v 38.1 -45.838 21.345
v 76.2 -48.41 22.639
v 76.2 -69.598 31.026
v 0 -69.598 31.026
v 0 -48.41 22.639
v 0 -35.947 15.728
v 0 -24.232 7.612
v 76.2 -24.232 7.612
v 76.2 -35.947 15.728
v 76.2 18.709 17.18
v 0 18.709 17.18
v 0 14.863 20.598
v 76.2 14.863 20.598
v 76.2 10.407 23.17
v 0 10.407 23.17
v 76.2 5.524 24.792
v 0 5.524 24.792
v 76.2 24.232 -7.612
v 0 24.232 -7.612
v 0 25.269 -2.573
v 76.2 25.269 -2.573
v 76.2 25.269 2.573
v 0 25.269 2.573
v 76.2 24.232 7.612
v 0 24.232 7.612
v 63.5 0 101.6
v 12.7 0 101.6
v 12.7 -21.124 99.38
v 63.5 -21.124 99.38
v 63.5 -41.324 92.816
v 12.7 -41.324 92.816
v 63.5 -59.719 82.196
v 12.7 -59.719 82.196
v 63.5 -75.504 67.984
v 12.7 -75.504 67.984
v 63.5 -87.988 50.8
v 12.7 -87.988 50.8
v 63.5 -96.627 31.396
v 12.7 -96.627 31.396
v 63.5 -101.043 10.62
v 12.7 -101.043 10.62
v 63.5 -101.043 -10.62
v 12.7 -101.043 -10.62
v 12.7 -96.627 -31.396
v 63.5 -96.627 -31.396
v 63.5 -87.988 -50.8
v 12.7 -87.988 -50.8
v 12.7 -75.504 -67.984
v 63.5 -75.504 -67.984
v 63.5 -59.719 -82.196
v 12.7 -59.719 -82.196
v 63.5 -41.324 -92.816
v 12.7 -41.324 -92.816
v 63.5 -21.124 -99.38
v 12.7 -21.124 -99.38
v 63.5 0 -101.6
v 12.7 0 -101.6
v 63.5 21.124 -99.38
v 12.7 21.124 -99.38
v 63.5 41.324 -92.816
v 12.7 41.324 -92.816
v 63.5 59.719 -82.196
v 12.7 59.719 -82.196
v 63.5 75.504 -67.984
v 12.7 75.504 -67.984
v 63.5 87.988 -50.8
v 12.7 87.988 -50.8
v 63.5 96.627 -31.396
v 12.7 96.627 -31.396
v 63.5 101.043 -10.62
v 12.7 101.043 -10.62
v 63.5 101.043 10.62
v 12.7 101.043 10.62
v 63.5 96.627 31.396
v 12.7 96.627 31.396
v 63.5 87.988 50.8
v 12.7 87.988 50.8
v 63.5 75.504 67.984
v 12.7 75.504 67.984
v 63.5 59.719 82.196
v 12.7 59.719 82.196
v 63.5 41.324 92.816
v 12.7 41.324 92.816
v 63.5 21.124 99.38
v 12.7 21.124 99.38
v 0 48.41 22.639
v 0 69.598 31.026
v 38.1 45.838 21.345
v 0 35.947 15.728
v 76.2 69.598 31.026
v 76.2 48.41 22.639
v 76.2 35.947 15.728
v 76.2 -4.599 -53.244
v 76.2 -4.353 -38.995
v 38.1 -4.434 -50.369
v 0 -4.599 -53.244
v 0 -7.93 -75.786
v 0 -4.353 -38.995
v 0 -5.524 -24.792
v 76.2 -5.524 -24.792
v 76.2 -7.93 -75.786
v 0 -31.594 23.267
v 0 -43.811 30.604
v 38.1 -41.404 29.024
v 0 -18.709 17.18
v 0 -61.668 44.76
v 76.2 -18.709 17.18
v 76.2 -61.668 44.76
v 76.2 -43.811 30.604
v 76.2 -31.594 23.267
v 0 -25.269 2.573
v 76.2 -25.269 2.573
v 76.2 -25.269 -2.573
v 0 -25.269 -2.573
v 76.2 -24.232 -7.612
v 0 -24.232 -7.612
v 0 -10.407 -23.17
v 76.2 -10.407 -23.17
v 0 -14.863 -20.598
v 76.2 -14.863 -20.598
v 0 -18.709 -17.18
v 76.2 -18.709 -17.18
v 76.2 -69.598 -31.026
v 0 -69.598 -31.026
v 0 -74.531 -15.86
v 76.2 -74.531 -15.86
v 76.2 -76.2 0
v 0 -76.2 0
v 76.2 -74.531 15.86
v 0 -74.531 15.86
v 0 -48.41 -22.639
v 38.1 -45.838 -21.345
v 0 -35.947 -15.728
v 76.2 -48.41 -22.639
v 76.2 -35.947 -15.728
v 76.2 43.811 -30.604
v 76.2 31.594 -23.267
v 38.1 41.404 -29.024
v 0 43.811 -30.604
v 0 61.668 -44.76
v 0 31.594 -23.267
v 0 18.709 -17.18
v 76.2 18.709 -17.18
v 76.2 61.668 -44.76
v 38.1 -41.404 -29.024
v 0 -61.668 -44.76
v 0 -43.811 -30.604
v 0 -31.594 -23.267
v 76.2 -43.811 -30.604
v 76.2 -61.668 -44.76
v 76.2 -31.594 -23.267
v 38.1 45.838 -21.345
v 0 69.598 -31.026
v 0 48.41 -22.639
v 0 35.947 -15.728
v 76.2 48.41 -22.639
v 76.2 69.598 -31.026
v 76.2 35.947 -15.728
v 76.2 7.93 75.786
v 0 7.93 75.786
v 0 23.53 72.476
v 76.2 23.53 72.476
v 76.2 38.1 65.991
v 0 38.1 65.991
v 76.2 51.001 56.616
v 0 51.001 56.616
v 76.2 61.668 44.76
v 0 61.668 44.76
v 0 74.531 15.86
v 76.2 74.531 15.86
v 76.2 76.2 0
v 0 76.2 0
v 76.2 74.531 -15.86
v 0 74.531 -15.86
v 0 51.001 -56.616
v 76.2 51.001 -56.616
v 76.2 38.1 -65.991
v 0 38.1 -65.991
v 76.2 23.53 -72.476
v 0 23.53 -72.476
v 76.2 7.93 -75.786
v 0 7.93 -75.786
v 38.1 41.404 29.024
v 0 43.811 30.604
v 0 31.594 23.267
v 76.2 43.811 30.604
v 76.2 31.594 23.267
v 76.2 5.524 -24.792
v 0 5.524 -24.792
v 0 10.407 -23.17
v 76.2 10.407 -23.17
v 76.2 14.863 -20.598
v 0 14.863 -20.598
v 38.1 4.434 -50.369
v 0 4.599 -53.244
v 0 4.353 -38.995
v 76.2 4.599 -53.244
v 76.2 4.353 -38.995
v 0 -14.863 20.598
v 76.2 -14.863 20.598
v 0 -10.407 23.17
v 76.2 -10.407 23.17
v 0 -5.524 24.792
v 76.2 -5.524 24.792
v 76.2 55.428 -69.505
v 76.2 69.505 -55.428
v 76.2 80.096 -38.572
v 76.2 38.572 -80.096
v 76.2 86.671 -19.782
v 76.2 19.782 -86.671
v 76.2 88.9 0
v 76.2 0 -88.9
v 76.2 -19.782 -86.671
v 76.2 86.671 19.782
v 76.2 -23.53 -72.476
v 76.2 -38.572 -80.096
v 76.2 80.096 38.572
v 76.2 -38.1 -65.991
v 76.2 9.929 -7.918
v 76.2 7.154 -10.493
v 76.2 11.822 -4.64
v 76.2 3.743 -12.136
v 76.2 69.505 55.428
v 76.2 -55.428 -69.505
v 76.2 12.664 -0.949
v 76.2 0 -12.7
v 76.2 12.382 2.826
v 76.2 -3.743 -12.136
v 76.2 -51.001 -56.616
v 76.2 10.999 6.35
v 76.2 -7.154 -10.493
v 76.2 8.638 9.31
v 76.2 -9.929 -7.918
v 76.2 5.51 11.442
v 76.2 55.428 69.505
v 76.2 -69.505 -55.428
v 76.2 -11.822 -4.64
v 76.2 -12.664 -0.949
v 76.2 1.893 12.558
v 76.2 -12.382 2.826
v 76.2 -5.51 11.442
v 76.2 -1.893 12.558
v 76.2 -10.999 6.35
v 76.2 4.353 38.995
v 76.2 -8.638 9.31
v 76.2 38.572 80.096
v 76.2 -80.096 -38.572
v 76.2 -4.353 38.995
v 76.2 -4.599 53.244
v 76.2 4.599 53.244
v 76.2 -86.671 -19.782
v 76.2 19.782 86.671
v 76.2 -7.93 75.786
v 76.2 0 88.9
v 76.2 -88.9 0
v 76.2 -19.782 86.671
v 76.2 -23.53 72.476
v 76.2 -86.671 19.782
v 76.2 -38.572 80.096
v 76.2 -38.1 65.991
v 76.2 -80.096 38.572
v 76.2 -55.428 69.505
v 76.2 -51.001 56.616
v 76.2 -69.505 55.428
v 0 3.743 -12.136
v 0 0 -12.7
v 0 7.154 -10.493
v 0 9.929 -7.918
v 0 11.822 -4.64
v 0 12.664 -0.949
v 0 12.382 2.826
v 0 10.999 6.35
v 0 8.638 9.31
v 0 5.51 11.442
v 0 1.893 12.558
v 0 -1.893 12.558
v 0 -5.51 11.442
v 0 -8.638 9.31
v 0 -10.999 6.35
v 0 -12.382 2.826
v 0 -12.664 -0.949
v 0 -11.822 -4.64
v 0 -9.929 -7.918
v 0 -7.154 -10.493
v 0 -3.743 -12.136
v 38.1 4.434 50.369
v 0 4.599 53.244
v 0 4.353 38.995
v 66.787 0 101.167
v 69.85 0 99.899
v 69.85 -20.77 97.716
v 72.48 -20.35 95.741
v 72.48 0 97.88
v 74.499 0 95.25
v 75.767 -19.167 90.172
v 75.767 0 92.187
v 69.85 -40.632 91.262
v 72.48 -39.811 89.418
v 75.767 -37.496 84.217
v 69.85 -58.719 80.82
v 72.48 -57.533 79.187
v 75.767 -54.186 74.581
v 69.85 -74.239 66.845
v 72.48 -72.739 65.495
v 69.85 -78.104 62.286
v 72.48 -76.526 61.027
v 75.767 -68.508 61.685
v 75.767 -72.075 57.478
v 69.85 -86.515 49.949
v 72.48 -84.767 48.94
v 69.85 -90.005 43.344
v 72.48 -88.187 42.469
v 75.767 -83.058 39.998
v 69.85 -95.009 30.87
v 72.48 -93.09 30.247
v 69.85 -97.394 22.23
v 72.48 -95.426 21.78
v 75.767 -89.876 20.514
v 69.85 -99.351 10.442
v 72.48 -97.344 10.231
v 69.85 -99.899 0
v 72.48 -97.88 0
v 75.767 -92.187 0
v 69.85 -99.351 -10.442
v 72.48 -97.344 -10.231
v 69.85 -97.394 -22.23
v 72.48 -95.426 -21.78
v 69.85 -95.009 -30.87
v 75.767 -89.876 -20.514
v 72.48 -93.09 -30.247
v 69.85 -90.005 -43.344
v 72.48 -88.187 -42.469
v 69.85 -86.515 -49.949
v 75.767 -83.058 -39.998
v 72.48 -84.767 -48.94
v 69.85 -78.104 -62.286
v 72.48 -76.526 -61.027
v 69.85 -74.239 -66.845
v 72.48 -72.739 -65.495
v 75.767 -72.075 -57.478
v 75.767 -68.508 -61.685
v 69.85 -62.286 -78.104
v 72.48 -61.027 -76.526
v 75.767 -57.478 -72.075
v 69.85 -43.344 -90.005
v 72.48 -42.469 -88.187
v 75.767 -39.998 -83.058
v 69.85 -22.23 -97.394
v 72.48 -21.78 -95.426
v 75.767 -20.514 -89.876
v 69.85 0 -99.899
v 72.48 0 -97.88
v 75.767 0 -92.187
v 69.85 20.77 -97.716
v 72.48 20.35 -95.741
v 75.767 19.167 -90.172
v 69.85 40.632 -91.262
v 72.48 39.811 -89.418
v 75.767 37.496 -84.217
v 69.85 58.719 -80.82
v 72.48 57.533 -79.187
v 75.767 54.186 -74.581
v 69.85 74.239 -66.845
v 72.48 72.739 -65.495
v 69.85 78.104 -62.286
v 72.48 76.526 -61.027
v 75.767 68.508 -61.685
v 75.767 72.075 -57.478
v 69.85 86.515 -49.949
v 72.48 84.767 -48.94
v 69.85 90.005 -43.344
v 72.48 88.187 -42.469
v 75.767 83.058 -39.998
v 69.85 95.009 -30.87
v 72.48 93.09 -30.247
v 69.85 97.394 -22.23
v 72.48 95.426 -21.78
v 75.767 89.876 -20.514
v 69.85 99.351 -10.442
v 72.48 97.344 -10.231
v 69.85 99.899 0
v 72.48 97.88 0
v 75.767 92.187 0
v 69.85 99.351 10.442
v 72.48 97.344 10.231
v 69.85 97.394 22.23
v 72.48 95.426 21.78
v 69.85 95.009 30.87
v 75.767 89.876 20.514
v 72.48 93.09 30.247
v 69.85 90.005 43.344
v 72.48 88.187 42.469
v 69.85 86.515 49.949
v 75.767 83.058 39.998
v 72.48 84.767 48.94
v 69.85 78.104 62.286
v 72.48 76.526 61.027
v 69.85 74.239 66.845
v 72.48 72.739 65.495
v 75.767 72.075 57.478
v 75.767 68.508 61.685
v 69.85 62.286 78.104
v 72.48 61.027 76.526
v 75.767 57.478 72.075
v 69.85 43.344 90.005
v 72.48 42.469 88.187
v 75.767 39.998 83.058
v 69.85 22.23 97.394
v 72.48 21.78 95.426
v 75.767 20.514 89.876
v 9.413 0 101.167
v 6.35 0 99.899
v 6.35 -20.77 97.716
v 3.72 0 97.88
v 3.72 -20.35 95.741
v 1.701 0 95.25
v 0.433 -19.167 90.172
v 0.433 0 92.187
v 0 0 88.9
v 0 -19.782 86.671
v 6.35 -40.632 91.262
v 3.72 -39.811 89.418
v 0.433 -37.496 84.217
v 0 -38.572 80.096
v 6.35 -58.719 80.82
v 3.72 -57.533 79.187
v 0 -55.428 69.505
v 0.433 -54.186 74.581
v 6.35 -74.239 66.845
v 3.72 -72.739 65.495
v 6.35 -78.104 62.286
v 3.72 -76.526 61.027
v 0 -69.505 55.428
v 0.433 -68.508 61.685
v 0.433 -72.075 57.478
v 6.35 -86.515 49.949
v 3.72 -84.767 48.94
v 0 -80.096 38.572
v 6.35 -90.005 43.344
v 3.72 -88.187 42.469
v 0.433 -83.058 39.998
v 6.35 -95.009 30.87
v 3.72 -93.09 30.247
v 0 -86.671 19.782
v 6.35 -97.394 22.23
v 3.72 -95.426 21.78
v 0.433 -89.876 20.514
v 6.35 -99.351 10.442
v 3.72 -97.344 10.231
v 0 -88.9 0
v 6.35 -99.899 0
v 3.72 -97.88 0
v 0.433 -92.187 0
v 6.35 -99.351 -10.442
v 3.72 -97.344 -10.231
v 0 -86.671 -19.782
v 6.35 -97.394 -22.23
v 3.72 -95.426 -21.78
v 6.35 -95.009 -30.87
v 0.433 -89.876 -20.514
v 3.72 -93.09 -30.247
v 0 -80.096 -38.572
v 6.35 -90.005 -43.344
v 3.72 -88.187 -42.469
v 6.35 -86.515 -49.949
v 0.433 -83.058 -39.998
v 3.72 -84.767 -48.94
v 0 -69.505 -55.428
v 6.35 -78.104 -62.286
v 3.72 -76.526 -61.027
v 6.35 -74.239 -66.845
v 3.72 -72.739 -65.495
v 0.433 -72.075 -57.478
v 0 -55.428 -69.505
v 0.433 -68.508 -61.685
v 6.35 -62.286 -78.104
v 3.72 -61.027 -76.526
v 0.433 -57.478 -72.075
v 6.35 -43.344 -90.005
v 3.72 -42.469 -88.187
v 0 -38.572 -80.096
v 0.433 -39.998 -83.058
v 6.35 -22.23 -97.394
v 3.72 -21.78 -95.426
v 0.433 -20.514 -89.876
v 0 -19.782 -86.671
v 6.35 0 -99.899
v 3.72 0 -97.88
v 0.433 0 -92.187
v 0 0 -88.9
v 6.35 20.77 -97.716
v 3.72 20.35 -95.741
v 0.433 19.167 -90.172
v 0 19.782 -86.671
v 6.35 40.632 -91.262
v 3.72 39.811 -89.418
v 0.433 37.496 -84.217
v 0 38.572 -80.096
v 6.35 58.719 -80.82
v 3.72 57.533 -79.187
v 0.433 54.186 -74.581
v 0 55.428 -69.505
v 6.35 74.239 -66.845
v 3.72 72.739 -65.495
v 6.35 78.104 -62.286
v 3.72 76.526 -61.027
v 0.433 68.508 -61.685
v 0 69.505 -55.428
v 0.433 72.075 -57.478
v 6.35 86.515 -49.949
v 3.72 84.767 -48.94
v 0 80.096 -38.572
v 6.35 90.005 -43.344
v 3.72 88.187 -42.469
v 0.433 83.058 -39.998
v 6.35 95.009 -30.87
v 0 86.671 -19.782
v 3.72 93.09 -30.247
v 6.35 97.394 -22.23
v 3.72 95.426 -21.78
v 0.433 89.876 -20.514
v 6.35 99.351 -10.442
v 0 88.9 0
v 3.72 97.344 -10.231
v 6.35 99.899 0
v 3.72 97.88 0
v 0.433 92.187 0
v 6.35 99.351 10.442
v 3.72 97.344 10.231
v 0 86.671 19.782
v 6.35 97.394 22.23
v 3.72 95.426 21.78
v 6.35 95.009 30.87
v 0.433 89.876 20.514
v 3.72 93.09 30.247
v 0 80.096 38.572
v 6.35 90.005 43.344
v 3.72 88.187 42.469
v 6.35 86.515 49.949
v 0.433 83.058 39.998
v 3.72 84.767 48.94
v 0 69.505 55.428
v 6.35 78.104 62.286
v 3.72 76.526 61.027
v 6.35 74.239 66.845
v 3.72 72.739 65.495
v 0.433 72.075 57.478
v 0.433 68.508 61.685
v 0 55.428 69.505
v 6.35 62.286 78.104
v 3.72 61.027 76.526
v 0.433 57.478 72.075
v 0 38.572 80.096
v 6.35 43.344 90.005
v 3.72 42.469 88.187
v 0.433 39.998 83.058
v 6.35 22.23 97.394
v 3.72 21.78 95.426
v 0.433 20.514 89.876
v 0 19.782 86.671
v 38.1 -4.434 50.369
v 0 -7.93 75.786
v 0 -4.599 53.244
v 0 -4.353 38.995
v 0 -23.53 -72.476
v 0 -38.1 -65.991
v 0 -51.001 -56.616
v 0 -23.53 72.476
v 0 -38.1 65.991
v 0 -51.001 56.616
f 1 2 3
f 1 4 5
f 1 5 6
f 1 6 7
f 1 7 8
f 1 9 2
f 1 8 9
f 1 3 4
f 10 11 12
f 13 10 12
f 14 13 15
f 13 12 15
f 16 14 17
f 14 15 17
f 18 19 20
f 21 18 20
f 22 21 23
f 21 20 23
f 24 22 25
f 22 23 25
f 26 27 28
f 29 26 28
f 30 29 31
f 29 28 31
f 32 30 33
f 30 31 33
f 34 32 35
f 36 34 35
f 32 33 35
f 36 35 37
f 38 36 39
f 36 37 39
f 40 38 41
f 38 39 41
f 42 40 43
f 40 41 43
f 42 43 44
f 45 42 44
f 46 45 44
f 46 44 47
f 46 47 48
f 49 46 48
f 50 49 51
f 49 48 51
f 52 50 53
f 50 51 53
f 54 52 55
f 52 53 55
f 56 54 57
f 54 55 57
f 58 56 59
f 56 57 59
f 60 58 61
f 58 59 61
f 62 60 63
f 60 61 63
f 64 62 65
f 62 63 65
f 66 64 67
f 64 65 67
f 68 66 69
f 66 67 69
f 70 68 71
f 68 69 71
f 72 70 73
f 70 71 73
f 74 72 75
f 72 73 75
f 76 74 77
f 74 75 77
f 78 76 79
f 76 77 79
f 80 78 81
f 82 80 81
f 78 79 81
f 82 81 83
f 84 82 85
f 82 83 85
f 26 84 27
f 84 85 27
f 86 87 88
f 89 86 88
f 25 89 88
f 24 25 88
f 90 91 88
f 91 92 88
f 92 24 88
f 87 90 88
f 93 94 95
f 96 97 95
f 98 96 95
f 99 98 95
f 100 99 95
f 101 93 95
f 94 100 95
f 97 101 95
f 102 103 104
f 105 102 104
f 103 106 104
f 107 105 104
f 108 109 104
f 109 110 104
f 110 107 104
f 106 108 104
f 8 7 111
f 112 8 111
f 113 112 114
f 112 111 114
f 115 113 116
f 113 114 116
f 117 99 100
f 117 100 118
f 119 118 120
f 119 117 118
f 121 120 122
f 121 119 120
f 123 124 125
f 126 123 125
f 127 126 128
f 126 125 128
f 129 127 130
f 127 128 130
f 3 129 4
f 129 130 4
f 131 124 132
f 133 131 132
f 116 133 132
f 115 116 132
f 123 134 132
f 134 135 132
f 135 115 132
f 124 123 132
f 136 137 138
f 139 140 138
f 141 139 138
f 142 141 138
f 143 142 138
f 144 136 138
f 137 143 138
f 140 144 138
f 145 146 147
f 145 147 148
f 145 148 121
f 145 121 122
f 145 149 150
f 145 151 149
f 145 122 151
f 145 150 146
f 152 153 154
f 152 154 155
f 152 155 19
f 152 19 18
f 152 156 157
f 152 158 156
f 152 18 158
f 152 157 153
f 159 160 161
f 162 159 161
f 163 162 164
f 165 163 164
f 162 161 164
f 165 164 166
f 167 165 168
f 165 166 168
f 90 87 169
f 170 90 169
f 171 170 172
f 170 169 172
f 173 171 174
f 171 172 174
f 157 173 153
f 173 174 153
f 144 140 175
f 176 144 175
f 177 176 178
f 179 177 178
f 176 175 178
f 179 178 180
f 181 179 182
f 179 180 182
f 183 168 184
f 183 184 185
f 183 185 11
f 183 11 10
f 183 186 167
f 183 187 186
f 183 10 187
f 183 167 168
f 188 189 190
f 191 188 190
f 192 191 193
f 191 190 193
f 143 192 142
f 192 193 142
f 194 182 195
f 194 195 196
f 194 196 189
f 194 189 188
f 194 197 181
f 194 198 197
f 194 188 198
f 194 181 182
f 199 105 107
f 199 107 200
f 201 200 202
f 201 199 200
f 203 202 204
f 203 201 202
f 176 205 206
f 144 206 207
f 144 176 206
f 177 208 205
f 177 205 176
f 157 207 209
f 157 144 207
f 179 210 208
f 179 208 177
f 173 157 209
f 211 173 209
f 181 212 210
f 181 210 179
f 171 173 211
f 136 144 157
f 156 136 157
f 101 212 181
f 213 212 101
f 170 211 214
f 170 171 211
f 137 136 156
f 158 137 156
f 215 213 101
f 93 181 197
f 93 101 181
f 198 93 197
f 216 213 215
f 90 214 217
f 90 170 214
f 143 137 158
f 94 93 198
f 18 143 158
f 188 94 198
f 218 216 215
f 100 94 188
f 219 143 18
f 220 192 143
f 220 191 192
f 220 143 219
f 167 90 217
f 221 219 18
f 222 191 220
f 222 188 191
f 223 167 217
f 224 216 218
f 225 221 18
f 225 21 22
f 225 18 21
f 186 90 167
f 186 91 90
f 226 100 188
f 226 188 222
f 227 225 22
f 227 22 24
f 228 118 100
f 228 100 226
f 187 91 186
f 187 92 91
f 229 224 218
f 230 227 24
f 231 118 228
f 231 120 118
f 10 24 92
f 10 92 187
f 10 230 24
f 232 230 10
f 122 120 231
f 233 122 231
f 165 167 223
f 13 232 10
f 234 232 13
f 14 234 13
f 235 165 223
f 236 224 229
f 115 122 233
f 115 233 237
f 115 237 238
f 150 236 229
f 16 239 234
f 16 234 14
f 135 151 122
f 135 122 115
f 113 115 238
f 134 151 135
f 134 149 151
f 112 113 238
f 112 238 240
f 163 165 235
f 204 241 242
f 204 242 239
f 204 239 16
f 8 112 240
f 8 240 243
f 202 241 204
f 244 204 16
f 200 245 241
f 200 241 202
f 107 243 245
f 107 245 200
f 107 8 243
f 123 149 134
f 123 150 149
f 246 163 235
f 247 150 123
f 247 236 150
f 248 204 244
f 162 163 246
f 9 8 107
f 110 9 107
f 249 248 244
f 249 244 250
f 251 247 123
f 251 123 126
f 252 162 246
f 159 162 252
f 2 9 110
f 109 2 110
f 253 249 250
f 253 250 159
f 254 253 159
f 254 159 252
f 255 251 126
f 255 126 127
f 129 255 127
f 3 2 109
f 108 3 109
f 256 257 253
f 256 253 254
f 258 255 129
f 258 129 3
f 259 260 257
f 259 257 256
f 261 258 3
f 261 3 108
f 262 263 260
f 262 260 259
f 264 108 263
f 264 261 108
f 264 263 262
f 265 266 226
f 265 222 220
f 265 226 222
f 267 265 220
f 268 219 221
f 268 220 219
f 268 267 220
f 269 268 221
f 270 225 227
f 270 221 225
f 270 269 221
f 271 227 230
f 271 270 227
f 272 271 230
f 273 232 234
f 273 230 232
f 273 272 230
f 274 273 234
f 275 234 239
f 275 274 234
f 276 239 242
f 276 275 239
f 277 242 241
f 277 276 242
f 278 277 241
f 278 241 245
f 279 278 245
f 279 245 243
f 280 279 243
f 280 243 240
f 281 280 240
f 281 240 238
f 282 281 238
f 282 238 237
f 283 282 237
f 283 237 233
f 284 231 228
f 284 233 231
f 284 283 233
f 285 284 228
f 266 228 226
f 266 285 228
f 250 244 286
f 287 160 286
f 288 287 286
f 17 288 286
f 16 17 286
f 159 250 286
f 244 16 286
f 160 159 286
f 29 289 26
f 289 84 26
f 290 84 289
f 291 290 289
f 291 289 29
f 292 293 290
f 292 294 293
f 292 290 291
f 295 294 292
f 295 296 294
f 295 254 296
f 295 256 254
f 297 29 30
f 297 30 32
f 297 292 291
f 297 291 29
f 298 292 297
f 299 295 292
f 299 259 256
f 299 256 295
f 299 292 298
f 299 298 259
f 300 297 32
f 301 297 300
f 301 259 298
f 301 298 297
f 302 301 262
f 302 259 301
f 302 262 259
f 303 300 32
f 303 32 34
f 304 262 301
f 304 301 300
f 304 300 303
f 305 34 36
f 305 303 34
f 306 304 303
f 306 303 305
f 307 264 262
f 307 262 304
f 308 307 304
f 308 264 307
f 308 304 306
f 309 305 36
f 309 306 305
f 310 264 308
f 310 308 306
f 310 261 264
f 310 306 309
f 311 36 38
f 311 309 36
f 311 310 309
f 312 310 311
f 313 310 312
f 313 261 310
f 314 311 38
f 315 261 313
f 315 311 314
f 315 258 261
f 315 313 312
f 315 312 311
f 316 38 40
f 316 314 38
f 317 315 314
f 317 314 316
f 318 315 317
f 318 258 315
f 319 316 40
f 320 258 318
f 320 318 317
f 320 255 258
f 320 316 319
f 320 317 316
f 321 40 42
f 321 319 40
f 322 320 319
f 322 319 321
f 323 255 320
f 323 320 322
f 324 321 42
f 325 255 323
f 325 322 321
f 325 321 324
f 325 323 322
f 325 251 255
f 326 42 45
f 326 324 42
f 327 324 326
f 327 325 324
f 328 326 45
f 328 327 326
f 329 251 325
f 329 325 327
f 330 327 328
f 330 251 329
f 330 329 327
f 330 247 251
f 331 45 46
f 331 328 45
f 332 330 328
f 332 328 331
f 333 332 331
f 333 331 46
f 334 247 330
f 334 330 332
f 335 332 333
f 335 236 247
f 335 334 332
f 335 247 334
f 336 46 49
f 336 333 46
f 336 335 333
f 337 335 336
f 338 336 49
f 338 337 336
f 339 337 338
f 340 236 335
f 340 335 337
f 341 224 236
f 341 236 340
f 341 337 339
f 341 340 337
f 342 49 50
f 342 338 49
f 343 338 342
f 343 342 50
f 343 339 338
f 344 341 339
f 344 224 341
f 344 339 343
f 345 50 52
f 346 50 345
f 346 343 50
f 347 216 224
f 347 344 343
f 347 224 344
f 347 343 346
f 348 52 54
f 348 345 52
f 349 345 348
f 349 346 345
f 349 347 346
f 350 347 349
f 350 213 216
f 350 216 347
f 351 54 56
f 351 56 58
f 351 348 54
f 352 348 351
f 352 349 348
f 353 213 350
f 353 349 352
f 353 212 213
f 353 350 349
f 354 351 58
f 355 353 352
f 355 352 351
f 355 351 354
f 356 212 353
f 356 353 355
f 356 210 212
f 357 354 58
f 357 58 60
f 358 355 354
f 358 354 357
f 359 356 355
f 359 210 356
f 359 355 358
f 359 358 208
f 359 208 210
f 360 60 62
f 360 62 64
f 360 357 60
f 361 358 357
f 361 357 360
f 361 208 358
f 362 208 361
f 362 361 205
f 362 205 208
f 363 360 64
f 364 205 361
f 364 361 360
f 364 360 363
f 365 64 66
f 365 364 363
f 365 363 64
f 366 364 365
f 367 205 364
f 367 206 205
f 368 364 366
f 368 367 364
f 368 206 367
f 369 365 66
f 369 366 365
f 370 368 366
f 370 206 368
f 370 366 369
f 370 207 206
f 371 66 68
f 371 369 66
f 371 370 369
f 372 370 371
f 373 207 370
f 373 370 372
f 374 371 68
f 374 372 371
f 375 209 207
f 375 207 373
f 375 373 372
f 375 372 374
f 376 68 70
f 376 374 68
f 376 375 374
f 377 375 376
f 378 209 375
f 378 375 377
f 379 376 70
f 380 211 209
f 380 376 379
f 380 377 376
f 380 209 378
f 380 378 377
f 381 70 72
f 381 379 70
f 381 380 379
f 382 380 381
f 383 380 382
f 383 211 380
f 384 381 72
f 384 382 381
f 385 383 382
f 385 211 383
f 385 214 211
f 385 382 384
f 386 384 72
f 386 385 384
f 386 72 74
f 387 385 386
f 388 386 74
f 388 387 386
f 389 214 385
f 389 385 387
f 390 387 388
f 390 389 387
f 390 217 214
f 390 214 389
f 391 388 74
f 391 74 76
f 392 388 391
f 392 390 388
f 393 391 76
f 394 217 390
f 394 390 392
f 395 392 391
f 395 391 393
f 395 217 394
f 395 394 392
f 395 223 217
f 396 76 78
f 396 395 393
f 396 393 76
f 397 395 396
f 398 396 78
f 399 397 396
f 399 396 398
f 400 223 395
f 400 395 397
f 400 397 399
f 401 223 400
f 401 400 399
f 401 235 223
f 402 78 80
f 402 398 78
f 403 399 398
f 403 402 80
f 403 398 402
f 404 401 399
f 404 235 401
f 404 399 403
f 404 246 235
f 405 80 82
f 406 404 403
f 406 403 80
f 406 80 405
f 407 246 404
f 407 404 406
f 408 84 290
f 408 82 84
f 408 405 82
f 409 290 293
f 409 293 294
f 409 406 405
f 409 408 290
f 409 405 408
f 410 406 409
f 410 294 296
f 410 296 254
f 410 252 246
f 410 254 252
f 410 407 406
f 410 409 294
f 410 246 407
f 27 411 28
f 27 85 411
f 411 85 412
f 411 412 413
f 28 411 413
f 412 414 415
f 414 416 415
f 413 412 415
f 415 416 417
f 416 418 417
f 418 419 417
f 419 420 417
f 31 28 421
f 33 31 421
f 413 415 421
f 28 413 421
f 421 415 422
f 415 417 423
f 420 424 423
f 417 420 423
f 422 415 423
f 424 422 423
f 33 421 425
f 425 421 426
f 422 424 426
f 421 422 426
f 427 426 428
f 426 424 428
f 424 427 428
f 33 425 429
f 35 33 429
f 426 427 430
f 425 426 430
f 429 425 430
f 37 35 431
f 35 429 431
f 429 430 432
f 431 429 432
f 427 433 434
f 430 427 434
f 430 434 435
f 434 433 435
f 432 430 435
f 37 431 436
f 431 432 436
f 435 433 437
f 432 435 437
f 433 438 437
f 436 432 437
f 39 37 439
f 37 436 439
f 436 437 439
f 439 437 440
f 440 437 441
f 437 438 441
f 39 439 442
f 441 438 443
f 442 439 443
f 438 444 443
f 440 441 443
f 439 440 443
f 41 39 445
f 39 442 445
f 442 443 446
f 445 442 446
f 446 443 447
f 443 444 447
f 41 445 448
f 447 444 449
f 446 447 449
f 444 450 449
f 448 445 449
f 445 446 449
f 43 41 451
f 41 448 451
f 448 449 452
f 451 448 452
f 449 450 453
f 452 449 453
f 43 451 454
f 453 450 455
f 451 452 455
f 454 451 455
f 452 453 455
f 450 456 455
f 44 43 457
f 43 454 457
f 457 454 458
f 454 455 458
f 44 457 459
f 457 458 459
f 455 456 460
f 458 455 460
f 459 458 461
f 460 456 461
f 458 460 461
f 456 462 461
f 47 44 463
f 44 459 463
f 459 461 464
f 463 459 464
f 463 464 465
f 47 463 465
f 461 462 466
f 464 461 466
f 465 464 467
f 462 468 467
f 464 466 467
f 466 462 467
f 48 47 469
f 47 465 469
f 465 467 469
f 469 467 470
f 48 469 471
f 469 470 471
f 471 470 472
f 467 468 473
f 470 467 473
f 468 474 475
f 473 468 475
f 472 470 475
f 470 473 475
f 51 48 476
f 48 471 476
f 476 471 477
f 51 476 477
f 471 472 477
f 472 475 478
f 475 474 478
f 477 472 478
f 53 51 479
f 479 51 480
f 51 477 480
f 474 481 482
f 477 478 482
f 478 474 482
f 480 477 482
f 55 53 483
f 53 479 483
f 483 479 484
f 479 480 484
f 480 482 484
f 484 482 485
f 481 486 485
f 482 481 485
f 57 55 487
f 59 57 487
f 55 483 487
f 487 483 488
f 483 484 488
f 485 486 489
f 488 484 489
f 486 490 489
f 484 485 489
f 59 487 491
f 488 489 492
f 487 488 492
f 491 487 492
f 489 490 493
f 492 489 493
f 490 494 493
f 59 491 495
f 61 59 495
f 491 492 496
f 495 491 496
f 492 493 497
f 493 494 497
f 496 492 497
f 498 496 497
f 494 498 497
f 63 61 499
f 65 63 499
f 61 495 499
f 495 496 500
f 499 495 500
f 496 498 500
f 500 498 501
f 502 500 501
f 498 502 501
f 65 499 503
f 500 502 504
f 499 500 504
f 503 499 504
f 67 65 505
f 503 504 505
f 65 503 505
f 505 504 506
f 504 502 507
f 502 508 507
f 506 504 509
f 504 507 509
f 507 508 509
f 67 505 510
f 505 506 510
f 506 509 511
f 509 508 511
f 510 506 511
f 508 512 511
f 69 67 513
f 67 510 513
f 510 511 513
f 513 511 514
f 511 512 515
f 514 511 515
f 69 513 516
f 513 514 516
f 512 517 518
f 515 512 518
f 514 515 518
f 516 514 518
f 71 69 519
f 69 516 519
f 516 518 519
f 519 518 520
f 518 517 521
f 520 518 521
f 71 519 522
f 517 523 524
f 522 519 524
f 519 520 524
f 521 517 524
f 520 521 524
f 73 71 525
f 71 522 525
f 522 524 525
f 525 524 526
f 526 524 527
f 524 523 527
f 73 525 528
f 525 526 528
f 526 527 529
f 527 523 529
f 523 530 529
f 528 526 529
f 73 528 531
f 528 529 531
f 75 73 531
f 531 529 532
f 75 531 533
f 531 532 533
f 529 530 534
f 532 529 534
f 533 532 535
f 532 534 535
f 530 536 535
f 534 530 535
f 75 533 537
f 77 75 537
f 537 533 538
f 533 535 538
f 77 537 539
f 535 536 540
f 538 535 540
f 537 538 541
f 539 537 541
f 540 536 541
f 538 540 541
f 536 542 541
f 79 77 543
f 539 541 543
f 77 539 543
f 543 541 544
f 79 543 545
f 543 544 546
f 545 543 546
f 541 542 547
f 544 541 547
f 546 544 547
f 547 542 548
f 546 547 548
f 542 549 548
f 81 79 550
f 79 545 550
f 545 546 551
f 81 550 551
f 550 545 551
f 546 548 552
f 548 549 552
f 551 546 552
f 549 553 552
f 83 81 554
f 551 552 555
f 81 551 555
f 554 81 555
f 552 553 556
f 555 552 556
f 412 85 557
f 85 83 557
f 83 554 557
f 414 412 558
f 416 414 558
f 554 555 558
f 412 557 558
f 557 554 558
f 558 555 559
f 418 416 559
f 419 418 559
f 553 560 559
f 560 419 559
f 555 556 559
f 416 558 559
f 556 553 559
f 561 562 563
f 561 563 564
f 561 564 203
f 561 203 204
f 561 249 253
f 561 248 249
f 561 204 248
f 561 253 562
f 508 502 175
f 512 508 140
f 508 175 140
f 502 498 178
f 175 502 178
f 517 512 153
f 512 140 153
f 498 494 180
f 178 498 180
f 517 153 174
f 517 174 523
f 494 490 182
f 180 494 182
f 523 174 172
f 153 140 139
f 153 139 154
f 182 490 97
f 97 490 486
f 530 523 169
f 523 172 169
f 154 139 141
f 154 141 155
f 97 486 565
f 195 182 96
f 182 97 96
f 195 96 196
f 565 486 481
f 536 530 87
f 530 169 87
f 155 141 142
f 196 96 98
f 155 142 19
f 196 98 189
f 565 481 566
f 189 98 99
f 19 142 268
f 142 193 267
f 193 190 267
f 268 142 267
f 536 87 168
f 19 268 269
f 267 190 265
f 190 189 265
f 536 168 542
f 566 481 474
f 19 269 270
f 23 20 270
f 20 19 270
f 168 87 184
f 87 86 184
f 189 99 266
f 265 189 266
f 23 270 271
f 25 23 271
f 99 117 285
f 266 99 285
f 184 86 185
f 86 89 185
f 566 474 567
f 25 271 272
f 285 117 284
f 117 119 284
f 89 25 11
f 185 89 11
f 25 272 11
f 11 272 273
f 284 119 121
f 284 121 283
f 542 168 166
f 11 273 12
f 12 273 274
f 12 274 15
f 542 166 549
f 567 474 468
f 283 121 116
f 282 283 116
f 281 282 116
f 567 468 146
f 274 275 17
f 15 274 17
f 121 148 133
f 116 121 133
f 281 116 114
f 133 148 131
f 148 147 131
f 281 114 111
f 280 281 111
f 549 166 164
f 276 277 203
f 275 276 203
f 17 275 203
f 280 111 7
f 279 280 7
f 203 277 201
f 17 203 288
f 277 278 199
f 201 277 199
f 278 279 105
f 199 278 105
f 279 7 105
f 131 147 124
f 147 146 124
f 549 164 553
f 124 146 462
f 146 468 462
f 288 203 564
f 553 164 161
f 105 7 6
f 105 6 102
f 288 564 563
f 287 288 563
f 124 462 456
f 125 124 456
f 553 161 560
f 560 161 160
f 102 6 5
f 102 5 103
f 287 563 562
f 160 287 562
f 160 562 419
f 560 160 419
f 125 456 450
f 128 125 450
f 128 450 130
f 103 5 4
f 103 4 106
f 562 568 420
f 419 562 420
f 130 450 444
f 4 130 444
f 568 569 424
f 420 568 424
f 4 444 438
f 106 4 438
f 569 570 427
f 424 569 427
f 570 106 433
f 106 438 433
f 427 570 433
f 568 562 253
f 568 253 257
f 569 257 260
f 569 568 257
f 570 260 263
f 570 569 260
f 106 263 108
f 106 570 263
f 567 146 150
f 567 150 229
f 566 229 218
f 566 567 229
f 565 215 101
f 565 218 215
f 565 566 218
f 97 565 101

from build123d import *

# Parameters (mm, degrees)
SKETCH1_R               = 101.6
BOSS_EXTRUDE1_DEPTH     = 76.2
FILLET1_R               = 12.7
CUT_EXTRUDE1_DEPTH      = 163.639355693
CUT_EXTRUDE1_DEPTH_BACK = 163.639355693
CUT_EXTRUDE2_DEPTH      = 163.63935574
CUT_EXTRUDE2_DEPTH_BACK = 163.63935574
SKETCH5_R               = 12.7


with BuildPart() as part:
    # Sketch1 → Boss-Extrude1 (new body)
    with BuildSketch(Plane.YZ):
        with Locations(Location((0, 0, 0), (0, 0, 90))):
            Circle(SKETCH1_R)
    extrude(amount=BOSS_EXTRUDE1_DEPTH)

    # Fillet1
    fillet1_edges = [part.edges().sort_by_distance(p)[0] for p in [
        (0, 0, -101.6),
        (76.2, 0, -101.6),
    ]]
    fillet(fillet1_edges, radius=FILLET1_R)

    # Sketch2 → Cut-Extrude1 (cut, two sides: drawn at the far end of the back side and taken through both)
    with BuildSketch(Plane.YZ.offset(76.2).offset(-CUT_EXTRUDE1_DEPTH_BACK)):
        with BuildLine():
            ThreePointArc((-24.232427185, 7.612455104), (-25.4, 0), (-24.232427185, -7.612455104))
            add(Edge.make_bspline(
                [(-24.232427185, -7.612455104), (-44.761154303, -23.370868648), (-69.597655338, -31.025898399)],
                knots=[0, 0, 0, 1, 1, 1], degree=2))
            ThreePointArc((-69.597655338, -31.025898399), (-76.2, 0), (-69.597655338, 31.025898399))
            add(Edge.make_bspline(
                [(-24.232427185, 7.612455104), (-44.761154303, 23.370868648), (-69.597655338, 31.025898399)],
                knots=[0, 0, 0, 1, 1, 1], degree=2))
        make_face()
        with BuildLine():
            ThreePointArc((18.708793098, 17.179669986), (12.7, 21.997045256), (5.523634087, 24.79212509))
            add(Edge.make_bspline(
                [(5.523634087, 24.79212509), (2.140811193, 50.449731053), (7.92961148, 75.786286766)],
                knots=[0, 0, 0, 1, 1, 1], degree=2))
            ThreePointArc((7.92961148, 75.786286766), (38.1, 65.991135768), (61.668043858, 44.760388367))
            add(Edge.make_bspline(
                [(18.708793098, 17.179669986), (42.620343109, 27.078862405), (61.668043858, 44.760388367)],
                knots=[0, 0, 0, 1, 1, 1], degree=2))
        make_face()
        with BuildLine():
            ThreePointArc((24.232427185, -7.612455104), (25.4, 0), (24.232427185, 7.612455104))
            add(Edge.make_bspline(
                [(24.232427185, 7.612455104), (44.761154303, 23.370868648), (69.597655338, 31.025898399)],
                knots=[0, 0, 0, 1, 1, 1], degree=2))
            ThreePointArc((69.597655338, 31.025898399), (76.2, 0), (69.597655338, -31.025898399))
            add(Edge.make_bspline(
                [(24.232427185, -7.612455104), (44.761154303, -23.370868648), (69.597655338, -31.025898399)],
                knots=[0, 0, 0, 1, 1, 1], degree=2))
        make_face()
        with BuildLine():
            ThreePointArc((-61.668043858, -44.760388367), (-38.1, -65.991135768), (-7.92961148, -75.786286766))
            add(Edge.make_bspline(
                [(-5.523634087, -24.79212509), (-2.140811193, -50.449731053), (-7.92961148, -75.786286766)],
                knots=[0, 0, 0, 1, 1, 1], degree=2))
            ThreePointArc((-5.523634087, -24.79212509), (-12.7, -21.997045256), (-18.708793098, -17.179669986))
            add(Edge.make_bspline(
                [(-18.708793098, -17.179669986), (-42.620343109, -27.078862405), (-61.668043858, -44.760388367)],
                knots=[0, 0, 0, 1, 1, 1], degree=2))
        make_face()
        with BuildLine():
            ThreePointArc((5.523634087, -24.79212509), (12.7, -21.997045256), (18.708793098, -17.179669986))
            add(Edge.make_bspline(
                [(18.708793098, -17.179669986), (42.620343109, -27.078862405), (61.668043858, -44.760388367)],
                knots=[0, 0, 0, 1, 1, 1], degree=2))
            ThreePointArc((61.668043858, -44.760388367), (38.1, -65.991135768), (7.92961148, -75.786286766))
            add(Edge.make_bspline(
                [(5.523634087, -24.79212509), (2.140811193, -50.449731053), (7.92961148, -75.786286766)],
                knots=[0, 0, 0, 1, 1, 1], degree=2))
        make_face()
        with BuildLine():
            ThreePointArc((-7.92961148, 75.786286766), (-38.1, 65.991135768), (-61.668043858, 44.760388367))
            add(Edge.make_bspline(
                [(-18.708793098, 17.179669986), (-42.620343109, 27.078862405), (-61.668043858, 44.760388367)],
                knots=[0, 0, 0, 1, 1, 1], degree=2))
            ThreePointArc((-18.708793098, 17.179669986), (-12.7, 21.997045256), (-5.523634087, 24.79212509))
            add(Edge.make_bspline(
                [(-5.523634087, 24.79212509), (-2.140811193, 50.449731053), (-7.92961148, 75.786286766)],
                knots=[0, 0, 0, 1, 1, 1], degree=2))
        make_face()
    extrude(amount=CUT_EXTRUDE1_DEPTH + CUT_EXTRUDE1_DEPTH_BACK, mode=Mode.SUBTRACT)

    # Sketch5 → Cut-Extrude2 (cut, two sides: drawn at the far end of the back side and taken through both)
    with BuildSketch(Plane.YZ.offset(76.2).offset(-CUT_EXTRUDE2_DEPTH_BACK)):
        with Locations(Location((0, 0, 0), (0, 0, 270))):
            Circle(SKETCH5_R)
    extrude(amount=CUT_EXTRUDE2_DEPTH + CUT_EXTRUDE2_DEPTH_BACK, mode=Mode.SUBTRACT)


solid = part.part
